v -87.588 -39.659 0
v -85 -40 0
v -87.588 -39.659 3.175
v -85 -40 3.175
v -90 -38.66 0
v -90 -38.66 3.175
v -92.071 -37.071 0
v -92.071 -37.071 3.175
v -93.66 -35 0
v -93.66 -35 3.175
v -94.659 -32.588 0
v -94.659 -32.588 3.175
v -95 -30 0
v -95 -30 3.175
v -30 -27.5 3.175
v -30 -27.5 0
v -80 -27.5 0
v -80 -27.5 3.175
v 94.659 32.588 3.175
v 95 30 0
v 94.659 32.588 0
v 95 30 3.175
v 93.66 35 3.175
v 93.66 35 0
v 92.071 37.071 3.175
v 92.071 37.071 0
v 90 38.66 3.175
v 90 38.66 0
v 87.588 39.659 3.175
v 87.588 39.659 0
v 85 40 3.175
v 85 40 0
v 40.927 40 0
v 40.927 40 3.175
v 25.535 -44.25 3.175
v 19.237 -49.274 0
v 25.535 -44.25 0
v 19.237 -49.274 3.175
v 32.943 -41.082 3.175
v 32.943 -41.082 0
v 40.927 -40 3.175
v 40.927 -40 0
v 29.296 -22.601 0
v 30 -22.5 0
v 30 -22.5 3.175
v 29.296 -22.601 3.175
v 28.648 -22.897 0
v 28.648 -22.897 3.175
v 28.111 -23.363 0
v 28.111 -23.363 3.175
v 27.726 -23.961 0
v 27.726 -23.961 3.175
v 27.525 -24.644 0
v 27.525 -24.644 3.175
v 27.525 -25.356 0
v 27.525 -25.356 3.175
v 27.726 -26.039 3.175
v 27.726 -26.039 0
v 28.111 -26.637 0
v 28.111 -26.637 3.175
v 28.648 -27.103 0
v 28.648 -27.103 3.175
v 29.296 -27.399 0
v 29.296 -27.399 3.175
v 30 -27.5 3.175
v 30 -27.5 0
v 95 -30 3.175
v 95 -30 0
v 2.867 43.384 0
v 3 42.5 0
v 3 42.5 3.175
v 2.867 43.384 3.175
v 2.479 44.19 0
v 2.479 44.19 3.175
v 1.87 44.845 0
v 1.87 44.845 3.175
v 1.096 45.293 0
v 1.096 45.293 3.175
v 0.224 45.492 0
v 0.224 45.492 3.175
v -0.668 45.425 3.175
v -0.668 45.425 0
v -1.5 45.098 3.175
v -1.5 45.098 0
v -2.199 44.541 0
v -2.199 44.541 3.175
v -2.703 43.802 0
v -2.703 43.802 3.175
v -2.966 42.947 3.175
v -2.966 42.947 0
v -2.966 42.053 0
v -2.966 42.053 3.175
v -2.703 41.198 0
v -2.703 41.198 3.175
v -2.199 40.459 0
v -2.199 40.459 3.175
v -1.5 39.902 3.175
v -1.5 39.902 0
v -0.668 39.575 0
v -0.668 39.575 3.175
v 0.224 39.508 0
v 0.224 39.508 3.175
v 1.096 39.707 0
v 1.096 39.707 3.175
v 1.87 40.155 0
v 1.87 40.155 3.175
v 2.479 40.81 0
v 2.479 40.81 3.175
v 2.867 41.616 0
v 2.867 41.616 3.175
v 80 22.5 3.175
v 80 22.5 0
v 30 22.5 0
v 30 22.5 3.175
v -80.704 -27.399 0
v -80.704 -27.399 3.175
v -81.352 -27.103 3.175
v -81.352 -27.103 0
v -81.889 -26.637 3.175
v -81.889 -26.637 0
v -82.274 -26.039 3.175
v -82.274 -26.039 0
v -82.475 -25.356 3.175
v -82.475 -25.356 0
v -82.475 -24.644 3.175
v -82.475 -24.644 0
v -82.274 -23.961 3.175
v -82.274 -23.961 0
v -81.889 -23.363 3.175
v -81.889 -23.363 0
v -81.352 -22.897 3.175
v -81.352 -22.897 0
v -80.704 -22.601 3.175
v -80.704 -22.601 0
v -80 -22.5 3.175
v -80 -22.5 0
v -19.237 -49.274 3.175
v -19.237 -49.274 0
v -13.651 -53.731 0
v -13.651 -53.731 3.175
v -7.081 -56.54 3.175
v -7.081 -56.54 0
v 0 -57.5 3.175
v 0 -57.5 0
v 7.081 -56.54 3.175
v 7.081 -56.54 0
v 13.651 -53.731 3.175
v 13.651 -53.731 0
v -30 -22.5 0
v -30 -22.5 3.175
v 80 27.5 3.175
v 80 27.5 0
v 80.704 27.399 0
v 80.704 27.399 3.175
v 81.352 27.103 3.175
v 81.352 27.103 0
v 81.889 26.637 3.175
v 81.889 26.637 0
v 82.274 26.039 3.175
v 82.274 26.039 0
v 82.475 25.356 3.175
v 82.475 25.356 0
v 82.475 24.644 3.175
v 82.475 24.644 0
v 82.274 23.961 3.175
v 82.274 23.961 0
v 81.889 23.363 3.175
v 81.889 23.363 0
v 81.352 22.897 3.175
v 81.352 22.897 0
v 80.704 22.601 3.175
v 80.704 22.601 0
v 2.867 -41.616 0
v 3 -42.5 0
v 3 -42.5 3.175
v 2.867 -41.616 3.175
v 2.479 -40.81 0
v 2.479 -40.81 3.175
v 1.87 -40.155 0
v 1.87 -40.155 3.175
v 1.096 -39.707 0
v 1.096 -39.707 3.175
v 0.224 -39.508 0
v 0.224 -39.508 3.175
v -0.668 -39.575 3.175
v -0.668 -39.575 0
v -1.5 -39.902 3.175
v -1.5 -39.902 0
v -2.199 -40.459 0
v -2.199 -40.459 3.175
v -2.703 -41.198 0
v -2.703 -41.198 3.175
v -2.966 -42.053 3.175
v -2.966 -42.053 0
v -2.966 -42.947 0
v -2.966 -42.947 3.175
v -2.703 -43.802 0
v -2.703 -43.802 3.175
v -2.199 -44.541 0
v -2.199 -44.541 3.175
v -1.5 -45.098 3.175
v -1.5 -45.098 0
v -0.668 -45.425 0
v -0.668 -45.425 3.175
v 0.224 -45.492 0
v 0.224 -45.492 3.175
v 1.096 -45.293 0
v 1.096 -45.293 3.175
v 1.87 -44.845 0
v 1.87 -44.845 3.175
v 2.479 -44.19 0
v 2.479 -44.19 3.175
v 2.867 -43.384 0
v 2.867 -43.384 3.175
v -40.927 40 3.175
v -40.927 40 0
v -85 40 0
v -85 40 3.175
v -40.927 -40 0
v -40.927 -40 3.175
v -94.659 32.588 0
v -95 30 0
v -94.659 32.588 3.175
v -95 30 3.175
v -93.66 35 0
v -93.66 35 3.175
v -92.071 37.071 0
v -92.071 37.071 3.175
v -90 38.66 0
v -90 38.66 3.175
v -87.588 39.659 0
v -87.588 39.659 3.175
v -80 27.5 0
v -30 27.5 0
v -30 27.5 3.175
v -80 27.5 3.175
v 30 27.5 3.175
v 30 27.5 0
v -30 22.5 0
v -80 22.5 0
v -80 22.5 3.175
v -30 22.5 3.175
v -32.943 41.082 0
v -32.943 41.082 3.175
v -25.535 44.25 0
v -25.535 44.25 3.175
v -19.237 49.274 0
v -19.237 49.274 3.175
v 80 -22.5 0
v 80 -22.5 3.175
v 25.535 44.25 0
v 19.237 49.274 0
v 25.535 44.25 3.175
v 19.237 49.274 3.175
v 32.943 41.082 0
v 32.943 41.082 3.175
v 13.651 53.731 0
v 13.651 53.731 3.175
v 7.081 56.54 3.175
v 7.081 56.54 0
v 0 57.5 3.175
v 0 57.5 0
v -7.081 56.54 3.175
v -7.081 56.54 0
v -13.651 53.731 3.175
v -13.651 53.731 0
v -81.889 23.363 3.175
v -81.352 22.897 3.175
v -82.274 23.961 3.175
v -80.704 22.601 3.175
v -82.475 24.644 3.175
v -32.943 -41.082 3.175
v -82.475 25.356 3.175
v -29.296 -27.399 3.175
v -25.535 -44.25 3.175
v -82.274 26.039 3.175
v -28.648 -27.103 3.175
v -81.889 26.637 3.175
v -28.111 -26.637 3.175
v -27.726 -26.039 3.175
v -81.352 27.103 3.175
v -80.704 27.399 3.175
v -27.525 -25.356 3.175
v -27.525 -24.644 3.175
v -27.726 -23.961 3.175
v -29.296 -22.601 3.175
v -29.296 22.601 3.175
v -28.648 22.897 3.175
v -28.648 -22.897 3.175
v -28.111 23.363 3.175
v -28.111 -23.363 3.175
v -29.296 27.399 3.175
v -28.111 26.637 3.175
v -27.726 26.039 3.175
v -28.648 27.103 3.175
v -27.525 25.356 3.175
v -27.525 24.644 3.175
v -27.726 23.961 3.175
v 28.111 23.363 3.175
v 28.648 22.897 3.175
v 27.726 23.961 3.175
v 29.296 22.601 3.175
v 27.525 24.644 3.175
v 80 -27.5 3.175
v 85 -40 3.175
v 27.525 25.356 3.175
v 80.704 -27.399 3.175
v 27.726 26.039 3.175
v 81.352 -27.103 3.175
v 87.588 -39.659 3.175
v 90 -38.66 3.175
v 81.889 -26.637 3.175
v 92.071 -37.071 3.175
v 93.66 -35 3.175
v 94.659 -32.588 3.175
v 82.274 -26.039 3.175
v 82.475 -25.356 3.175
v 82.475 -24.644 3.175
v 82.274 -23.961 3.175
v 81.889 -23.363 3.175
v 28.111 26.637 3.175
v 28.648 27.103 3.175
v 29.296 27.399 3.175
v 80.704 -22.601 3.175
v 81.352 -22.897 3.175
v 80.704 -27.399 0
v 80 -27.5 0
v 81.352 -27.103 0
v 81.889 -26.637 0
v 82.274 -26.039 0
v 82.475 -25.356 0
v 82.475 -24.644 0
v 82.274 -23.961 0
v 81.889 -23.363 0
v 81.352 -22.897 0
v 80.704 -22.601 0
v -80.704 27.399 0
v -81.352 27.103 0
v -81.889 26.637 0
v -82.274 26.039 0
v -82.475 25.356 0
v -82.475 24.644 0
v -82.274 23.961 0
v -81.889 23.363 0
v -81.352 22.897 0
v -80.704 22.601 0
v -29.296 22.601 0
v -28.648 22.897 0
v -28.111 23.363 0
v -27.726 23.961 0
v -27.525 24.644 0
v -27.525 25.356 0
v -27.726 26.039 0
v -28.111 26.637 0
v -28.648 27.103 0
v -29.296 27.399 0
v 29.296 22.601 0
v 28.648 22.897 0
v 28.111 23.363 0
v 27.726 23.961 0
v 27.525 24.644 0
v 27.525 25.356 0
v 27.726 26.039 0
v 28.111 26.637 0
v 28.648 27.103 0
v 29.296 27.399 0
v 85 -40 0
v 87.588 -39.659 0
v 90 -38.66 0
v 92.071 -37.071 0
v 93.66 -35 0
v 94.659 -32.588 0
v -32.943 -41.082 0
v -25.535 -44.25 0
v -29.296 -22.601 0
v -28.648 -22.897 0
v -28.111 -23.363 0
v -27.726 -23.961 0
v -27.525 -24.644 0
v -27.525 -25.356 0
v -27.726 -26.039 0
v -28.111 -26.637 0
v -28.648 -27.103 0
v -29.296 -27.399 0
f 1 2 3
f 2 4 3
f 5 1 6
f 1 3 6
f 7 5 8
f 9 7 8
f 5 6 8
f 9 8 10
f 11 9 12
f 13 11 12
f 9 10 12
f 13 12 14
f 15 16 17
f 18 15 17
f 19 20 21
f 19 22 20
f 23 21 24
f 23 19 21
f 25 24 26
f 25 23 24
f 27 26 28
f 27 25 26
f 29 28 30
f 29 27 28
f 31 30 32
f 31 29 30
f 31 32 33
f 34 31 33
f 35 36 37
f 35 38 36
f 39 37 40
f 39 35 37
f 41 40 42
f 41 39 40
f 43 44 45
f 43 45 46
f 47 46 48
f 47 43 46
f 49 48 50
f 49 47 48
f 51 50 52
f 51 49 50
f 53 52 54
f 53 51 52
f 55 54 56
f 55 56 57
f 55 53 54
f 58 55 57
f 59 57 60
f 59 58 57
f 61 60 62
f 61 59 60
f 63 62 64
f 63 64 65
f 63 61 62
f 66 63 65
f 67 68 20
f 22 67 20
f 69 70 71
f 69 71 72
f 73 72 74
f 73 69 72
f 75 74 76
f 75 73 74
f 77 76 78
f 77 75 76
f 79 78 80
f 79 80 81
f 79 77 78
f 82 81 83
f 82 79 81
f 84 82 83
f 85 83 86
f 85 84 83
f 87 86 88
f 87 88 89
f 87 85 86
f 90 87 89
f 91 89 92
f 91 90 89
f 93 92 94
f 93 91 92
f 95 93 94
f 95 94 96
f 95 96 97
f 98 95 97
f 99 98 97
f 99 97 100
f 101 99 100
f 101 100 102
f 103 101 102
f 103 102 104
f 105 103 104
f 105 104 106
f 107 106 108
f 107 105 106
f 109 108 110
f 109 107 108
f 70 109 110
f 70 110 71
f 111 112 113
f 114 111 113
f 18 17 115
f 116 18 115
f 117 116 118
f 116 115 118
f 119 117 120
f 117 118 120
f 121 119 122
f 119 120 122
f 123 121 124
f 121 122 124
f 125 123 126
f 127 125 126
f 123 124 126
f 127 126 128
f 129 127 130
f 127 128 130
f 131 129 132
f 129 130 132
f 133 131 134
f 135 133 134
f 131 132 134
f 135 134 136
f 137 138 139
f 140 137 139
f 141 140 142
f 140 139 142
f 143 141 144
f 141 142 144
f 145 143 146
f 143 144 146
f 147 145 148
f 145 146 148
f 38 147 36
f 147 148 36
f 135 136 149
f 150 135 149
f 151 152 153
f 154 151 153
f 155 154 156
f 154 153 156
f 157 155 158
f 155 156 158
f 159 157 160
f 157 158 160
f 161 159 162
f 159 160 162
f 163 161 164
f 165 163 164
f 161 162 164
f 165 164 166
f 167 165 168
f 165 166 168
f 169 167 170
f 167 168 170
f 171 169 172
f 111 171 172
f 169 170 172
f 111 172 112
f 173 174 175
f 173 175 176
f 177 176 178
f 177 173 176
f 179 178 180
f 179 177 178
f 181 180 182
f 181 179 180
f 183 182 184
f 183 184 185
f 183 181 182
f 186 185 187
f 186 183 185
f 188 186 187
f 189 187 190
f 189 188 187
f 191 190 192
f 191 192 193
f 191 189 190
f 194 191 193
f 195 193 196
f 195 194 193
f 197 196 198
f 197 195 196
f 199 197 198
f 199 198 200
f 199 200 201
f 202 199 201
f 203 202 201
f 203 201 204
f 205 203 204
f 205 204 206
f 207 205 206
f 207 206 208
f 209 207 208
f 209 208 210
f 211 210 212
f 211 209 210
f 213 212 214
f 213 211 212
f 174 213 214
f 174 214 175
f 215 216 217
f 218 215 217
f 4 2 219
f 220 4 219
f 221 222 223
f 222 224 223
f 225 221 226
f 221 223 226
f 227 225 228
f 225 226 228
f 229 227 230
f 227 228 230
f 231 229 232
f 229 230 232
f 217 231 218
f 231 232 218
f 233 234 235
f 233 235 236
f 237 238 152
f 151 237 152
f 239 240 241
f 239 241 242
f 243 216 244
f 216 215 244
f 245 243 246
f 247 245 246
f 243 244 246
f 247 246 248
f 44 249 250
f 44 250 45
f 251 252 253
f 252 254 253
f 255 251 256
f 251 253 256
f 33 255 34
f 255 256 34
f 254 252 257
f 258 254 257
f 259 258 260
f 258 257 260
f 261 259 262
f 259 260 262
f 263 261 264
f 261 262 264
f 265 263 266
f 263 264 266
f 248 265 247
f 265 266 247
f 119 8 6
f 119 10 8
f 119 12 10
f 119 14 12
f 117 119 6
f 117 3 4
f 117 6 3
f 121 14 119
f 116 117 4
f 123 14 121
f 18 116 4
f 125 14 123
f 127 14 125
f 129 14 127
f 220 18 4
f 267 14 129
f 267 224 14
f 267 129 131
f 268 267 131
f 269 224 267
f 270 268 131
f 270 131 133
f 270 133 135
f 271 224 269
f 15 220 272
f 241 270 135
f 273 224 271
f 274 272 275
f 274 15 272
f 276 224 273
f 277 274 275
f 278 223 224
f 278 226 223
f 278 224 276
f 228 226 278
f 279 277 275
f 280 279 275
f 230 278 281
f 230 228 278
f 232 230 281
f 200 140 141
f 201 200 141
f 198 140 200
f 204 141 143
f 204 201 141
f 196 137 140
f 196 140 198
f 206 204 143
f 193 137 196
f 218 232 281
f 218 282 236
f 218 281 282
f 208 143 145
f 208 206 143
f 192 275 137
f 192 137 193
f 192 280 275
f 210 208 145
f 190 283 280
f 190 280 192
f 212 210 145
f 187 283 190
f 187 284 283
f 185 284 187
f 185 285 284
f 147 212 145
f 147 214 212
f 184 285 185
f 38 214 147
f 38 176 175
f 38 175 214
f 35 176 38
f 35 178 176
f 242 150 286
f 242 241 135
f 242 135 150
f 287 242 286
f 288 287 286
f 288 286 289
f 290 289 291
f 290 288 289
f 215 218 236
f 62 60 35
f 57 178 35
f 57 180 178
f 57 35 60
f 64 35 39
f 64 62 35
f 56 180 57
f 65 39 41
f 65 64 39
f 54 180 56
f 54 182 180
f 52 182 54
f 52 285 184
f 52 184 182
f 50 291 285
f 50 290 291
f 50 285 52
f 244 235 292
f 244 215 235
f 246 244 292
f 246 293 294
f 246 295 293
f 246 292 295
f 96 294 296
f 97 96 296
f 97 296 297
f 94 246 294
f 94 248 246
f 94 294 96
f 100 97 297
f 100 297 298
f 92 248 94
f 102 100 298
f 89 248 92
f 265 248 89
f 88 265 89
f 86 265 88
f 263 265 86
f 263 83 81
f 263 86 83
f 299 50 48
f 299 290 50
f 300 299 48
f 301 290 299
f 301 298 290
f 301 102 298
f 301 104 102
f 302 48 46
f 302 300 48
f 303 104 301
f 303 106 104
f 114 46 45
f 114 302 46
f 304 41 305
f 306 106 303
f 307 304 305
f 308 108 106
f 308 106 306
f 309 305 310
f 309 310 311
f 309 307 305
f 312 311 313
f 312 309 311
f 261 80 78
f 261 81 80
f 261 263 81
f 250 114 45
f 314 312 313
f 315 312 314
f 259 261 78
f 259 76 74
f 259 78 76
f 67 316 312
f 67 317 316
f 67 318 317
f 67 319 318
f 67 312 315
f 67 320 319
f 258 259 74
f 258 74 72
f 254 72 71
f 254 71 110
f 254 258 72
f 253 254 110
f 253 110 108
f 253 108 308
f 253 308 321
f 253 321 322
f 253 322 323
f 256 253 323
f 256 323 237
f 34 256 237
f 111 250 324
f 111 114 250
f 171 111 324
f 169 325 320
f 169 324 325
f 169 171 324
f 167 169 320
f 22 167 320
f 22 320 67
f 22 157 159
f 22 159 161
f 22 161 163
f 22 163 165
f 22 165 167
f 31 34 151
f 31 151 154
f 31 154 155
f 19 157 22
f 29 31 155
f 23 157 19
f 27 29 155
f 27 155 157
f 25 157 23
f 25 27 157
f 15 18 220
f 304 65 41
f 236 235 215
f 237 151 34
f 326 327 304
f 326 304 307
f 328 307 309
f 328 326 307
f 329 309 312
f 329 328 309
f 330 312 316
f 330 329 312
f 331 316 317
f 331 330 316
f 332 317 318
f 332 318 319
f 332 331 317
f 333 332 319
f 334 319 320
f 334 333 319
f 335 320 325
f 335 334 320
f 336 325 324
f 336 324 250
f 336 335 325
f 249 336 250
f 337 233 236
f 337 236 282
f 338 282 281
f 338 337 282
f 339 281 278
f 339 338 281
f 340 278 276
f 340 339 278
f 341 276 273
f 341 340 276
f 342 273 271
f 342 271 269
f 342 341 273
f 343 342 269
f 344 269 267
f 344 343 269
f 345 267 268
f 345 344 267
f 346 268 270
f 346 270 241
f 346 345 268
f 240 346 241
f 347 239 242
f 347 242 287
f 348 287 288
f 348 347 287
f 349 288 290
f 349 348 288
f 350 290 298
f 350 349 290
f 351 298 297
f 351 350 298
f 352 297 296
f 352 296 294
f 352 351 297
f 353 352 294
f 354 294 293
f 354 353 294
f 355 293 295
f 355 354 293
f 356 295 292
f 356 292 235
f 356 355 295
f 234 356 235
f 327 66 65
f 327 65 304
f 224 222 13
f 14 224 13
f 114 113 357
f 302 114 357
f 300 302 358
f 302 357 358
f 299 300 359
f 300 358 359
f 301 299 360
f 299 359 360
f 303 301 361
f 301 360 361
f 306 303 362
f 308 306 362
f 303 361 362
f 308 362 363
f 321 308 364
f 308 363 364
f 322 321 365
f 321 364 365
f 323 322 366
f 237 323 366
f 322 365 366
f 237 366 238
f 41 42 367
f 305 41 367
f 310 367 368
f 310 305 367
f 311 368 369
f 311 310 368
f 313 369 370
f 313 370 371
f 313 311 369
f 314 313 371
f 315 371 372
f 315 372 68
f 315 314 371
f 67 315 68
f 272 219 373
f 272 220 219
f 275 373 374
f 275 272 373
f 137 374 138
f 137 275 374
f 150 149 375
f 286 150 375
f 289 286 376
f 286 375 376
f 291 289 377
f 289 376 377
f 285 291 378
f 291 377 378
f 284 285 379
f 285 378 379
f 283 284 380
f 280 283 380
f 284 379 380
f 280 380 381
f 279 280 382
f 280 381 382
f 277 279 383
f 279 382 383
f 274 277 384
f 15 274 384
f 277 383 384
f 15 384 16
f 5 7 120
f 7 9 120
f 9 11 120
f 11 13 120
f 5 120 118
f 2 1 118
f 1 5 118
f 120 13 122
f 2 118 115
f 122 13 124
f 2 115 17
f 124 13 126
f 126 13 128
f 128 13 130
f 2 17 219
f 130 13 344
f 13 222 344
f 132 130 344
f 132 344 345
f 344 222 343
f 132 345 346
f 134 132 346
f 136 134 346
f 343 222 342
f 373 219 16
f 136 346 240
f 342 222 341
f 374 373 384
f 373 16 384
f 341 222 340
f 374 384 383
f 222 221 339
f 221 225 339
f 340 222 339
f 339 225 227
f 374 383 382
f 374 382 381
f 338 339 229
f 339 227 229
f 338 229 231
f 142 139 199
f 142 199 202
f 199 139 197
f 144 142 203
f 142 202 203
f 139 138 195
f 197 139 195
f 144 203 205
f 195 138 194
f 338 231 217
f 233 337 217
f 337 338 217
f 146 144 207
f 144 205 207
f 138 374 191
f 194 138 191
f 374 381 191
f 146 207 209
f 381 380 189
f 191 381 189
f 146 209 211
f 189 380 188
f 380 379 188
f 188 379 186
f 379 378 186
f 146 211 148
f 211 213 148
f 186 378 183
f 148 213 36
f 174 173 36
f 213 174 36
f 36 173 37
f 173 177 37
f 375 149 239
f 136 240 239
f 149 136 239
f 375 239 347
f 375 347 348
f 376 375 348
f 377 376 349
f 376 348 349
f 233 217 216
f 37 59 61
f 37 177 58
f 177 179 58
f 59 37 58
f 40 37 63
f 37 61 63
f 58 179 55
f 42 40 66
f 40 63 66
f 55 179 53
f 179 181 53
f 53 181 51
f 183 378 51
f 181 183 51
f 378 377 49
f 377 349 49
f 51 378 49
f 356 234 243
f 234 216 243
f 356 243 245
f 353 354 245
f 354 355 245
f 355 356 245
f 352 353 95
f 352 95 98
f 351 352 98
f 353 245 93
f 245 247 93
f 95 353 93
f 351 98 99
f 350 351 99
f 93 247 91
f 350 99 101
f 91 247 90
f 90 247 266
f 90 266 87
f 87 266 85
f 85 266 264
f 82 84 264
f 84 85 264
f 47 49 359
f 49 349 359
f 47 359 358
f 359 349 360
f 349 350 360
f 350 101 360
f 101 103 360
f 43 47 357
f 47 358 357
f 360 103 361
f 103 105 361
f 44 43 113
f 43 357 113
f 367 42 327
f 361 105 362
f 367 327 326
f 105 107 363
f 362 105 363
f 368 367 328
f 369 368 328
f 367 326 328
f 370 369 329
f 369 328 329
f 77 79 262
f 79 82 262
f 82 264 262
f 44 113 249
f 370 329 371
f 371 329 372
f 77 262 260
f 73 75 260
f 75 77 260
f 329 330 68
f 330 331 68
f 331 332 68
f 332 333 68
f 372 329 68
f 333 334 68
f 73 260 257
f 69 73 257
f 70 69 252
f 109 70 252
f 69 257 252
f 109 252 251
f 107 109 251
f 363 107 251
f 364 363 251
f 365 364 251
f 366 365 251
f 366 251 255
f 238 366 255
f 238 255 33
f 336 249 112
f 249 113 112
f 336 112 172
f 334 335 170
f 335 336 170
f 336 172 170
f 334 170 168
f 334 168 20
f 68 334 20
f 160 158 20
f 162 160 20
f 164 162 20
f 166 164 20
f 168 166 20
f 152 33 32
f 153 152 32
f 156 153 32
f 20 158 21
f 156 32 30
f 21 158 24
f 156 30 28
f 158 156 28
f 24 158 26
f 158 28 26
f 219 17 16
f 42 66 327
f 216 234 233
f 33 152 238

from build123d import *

# Parameters (mm, degrees)
SKETCH1_R           = 3
BOSS_EXTRUDE1_DEPTH = 3.175
FILLET1_R           = 10
FILLET2_R           = 30


with BuildPart() as part:
    # Sketch1 → Boss-Extrude1 (new body)
    with BuildSketch(Plane.XY):
        with BuildLine():
            Line((-95, -40), (-25, -40))
            ThreePointArc((-25, -40), (0, -57.5), (25, -40))
            Line((25, -40), (95, -40))
            Line((95, -40), (95, 40))
            Line((95, 40), (25, 40))
            ThreePointArc((25, 40), (0, 57.5), (-25, 40))
            Line((-25, 40), (-95, 40))
            Line((-95, 40), (-95, -40))
        make_face()
        with Locations((0, 42.5)):
            Circle(SKETCH1_R, mode=Mode.SUBTRACT)
        with Locations((0, -42.5)):
            Circle(SKETCH1_R, mode=Mode.SUBTRACT)
        with BuildLine():
            Line((30, 27.5), (80, 27.5))
            ThreePointArc((80, 27.5), (82.5, 25), (80, 22.5))
            Line((80, 22.5), (30, 22.5))
            ThreePointArc((30, 22.5), (27.5, 25), (30, 27.5))
        make_face(mode=Mode.SUBTRACT)
        with BuildLine():
            Line((30, -27.5), (80, -27.5))
            ThreePointArc((80, -27.5), (82.5, -25), (80, -22.5))
            Line((80, -22.5), (30, -22.5))
            ThreePointArc((30, -22.5), (27.5, -25), (30, -27.5))
        make_face(mode=Mode.SUBTRACT)
        with BuildLine():
            Line((-30, 27.5), (-80, 27.5))
            ThreePointArc((-80, 27.5), (-82.5, 25), (-80, 22.5))
            Line((-80, 22.5), (-30, 22.5))
            ThreePointArc((-30, 22.5), (-27.5, 25), (-30, 27.5))
        make_face(mode=Mode.SUBTRACT)
        with BuildLine():
            Line((-30, -27.5), (-80, -27.5))
            ThreePointArc((-80, -27.5), (-82.5, -25), (-80, -22.5))
            Line((-80, -22.5), (-30, -22.5))
            ThreePointArc((-30, -22.5), (-27.5, -25), (-30, -27.5))
        make_face(mode=Mode.SUBTRACT)
    extrude(amount=BOSS_EXTRUDE1_DEPTH)

    # Fillet1
    fillet1_edges = [part.edges().sort_by_distance(p)[0] for p in [
        (95, 40, 1.5875),
        (95, -40, 1.5875),
        (-95, -40, 1.5875),
        (-95, 40, 1.5875),
    ]]
    fillet(fillet1_edges, radius=FILLET1_R)

    # Fillet2
    fillet2_edges = [part.edges().sort_by_distance(p)[0] for p in [
        (25, -40, 1.5875),
        (-25, -40, 1.5875),
        (-25, 40, 1.5875),
        (25, 40, 1.5875),
    ]]
    fillet(fillet2_edges, radius=FILLET2_R)


solid = part.part
